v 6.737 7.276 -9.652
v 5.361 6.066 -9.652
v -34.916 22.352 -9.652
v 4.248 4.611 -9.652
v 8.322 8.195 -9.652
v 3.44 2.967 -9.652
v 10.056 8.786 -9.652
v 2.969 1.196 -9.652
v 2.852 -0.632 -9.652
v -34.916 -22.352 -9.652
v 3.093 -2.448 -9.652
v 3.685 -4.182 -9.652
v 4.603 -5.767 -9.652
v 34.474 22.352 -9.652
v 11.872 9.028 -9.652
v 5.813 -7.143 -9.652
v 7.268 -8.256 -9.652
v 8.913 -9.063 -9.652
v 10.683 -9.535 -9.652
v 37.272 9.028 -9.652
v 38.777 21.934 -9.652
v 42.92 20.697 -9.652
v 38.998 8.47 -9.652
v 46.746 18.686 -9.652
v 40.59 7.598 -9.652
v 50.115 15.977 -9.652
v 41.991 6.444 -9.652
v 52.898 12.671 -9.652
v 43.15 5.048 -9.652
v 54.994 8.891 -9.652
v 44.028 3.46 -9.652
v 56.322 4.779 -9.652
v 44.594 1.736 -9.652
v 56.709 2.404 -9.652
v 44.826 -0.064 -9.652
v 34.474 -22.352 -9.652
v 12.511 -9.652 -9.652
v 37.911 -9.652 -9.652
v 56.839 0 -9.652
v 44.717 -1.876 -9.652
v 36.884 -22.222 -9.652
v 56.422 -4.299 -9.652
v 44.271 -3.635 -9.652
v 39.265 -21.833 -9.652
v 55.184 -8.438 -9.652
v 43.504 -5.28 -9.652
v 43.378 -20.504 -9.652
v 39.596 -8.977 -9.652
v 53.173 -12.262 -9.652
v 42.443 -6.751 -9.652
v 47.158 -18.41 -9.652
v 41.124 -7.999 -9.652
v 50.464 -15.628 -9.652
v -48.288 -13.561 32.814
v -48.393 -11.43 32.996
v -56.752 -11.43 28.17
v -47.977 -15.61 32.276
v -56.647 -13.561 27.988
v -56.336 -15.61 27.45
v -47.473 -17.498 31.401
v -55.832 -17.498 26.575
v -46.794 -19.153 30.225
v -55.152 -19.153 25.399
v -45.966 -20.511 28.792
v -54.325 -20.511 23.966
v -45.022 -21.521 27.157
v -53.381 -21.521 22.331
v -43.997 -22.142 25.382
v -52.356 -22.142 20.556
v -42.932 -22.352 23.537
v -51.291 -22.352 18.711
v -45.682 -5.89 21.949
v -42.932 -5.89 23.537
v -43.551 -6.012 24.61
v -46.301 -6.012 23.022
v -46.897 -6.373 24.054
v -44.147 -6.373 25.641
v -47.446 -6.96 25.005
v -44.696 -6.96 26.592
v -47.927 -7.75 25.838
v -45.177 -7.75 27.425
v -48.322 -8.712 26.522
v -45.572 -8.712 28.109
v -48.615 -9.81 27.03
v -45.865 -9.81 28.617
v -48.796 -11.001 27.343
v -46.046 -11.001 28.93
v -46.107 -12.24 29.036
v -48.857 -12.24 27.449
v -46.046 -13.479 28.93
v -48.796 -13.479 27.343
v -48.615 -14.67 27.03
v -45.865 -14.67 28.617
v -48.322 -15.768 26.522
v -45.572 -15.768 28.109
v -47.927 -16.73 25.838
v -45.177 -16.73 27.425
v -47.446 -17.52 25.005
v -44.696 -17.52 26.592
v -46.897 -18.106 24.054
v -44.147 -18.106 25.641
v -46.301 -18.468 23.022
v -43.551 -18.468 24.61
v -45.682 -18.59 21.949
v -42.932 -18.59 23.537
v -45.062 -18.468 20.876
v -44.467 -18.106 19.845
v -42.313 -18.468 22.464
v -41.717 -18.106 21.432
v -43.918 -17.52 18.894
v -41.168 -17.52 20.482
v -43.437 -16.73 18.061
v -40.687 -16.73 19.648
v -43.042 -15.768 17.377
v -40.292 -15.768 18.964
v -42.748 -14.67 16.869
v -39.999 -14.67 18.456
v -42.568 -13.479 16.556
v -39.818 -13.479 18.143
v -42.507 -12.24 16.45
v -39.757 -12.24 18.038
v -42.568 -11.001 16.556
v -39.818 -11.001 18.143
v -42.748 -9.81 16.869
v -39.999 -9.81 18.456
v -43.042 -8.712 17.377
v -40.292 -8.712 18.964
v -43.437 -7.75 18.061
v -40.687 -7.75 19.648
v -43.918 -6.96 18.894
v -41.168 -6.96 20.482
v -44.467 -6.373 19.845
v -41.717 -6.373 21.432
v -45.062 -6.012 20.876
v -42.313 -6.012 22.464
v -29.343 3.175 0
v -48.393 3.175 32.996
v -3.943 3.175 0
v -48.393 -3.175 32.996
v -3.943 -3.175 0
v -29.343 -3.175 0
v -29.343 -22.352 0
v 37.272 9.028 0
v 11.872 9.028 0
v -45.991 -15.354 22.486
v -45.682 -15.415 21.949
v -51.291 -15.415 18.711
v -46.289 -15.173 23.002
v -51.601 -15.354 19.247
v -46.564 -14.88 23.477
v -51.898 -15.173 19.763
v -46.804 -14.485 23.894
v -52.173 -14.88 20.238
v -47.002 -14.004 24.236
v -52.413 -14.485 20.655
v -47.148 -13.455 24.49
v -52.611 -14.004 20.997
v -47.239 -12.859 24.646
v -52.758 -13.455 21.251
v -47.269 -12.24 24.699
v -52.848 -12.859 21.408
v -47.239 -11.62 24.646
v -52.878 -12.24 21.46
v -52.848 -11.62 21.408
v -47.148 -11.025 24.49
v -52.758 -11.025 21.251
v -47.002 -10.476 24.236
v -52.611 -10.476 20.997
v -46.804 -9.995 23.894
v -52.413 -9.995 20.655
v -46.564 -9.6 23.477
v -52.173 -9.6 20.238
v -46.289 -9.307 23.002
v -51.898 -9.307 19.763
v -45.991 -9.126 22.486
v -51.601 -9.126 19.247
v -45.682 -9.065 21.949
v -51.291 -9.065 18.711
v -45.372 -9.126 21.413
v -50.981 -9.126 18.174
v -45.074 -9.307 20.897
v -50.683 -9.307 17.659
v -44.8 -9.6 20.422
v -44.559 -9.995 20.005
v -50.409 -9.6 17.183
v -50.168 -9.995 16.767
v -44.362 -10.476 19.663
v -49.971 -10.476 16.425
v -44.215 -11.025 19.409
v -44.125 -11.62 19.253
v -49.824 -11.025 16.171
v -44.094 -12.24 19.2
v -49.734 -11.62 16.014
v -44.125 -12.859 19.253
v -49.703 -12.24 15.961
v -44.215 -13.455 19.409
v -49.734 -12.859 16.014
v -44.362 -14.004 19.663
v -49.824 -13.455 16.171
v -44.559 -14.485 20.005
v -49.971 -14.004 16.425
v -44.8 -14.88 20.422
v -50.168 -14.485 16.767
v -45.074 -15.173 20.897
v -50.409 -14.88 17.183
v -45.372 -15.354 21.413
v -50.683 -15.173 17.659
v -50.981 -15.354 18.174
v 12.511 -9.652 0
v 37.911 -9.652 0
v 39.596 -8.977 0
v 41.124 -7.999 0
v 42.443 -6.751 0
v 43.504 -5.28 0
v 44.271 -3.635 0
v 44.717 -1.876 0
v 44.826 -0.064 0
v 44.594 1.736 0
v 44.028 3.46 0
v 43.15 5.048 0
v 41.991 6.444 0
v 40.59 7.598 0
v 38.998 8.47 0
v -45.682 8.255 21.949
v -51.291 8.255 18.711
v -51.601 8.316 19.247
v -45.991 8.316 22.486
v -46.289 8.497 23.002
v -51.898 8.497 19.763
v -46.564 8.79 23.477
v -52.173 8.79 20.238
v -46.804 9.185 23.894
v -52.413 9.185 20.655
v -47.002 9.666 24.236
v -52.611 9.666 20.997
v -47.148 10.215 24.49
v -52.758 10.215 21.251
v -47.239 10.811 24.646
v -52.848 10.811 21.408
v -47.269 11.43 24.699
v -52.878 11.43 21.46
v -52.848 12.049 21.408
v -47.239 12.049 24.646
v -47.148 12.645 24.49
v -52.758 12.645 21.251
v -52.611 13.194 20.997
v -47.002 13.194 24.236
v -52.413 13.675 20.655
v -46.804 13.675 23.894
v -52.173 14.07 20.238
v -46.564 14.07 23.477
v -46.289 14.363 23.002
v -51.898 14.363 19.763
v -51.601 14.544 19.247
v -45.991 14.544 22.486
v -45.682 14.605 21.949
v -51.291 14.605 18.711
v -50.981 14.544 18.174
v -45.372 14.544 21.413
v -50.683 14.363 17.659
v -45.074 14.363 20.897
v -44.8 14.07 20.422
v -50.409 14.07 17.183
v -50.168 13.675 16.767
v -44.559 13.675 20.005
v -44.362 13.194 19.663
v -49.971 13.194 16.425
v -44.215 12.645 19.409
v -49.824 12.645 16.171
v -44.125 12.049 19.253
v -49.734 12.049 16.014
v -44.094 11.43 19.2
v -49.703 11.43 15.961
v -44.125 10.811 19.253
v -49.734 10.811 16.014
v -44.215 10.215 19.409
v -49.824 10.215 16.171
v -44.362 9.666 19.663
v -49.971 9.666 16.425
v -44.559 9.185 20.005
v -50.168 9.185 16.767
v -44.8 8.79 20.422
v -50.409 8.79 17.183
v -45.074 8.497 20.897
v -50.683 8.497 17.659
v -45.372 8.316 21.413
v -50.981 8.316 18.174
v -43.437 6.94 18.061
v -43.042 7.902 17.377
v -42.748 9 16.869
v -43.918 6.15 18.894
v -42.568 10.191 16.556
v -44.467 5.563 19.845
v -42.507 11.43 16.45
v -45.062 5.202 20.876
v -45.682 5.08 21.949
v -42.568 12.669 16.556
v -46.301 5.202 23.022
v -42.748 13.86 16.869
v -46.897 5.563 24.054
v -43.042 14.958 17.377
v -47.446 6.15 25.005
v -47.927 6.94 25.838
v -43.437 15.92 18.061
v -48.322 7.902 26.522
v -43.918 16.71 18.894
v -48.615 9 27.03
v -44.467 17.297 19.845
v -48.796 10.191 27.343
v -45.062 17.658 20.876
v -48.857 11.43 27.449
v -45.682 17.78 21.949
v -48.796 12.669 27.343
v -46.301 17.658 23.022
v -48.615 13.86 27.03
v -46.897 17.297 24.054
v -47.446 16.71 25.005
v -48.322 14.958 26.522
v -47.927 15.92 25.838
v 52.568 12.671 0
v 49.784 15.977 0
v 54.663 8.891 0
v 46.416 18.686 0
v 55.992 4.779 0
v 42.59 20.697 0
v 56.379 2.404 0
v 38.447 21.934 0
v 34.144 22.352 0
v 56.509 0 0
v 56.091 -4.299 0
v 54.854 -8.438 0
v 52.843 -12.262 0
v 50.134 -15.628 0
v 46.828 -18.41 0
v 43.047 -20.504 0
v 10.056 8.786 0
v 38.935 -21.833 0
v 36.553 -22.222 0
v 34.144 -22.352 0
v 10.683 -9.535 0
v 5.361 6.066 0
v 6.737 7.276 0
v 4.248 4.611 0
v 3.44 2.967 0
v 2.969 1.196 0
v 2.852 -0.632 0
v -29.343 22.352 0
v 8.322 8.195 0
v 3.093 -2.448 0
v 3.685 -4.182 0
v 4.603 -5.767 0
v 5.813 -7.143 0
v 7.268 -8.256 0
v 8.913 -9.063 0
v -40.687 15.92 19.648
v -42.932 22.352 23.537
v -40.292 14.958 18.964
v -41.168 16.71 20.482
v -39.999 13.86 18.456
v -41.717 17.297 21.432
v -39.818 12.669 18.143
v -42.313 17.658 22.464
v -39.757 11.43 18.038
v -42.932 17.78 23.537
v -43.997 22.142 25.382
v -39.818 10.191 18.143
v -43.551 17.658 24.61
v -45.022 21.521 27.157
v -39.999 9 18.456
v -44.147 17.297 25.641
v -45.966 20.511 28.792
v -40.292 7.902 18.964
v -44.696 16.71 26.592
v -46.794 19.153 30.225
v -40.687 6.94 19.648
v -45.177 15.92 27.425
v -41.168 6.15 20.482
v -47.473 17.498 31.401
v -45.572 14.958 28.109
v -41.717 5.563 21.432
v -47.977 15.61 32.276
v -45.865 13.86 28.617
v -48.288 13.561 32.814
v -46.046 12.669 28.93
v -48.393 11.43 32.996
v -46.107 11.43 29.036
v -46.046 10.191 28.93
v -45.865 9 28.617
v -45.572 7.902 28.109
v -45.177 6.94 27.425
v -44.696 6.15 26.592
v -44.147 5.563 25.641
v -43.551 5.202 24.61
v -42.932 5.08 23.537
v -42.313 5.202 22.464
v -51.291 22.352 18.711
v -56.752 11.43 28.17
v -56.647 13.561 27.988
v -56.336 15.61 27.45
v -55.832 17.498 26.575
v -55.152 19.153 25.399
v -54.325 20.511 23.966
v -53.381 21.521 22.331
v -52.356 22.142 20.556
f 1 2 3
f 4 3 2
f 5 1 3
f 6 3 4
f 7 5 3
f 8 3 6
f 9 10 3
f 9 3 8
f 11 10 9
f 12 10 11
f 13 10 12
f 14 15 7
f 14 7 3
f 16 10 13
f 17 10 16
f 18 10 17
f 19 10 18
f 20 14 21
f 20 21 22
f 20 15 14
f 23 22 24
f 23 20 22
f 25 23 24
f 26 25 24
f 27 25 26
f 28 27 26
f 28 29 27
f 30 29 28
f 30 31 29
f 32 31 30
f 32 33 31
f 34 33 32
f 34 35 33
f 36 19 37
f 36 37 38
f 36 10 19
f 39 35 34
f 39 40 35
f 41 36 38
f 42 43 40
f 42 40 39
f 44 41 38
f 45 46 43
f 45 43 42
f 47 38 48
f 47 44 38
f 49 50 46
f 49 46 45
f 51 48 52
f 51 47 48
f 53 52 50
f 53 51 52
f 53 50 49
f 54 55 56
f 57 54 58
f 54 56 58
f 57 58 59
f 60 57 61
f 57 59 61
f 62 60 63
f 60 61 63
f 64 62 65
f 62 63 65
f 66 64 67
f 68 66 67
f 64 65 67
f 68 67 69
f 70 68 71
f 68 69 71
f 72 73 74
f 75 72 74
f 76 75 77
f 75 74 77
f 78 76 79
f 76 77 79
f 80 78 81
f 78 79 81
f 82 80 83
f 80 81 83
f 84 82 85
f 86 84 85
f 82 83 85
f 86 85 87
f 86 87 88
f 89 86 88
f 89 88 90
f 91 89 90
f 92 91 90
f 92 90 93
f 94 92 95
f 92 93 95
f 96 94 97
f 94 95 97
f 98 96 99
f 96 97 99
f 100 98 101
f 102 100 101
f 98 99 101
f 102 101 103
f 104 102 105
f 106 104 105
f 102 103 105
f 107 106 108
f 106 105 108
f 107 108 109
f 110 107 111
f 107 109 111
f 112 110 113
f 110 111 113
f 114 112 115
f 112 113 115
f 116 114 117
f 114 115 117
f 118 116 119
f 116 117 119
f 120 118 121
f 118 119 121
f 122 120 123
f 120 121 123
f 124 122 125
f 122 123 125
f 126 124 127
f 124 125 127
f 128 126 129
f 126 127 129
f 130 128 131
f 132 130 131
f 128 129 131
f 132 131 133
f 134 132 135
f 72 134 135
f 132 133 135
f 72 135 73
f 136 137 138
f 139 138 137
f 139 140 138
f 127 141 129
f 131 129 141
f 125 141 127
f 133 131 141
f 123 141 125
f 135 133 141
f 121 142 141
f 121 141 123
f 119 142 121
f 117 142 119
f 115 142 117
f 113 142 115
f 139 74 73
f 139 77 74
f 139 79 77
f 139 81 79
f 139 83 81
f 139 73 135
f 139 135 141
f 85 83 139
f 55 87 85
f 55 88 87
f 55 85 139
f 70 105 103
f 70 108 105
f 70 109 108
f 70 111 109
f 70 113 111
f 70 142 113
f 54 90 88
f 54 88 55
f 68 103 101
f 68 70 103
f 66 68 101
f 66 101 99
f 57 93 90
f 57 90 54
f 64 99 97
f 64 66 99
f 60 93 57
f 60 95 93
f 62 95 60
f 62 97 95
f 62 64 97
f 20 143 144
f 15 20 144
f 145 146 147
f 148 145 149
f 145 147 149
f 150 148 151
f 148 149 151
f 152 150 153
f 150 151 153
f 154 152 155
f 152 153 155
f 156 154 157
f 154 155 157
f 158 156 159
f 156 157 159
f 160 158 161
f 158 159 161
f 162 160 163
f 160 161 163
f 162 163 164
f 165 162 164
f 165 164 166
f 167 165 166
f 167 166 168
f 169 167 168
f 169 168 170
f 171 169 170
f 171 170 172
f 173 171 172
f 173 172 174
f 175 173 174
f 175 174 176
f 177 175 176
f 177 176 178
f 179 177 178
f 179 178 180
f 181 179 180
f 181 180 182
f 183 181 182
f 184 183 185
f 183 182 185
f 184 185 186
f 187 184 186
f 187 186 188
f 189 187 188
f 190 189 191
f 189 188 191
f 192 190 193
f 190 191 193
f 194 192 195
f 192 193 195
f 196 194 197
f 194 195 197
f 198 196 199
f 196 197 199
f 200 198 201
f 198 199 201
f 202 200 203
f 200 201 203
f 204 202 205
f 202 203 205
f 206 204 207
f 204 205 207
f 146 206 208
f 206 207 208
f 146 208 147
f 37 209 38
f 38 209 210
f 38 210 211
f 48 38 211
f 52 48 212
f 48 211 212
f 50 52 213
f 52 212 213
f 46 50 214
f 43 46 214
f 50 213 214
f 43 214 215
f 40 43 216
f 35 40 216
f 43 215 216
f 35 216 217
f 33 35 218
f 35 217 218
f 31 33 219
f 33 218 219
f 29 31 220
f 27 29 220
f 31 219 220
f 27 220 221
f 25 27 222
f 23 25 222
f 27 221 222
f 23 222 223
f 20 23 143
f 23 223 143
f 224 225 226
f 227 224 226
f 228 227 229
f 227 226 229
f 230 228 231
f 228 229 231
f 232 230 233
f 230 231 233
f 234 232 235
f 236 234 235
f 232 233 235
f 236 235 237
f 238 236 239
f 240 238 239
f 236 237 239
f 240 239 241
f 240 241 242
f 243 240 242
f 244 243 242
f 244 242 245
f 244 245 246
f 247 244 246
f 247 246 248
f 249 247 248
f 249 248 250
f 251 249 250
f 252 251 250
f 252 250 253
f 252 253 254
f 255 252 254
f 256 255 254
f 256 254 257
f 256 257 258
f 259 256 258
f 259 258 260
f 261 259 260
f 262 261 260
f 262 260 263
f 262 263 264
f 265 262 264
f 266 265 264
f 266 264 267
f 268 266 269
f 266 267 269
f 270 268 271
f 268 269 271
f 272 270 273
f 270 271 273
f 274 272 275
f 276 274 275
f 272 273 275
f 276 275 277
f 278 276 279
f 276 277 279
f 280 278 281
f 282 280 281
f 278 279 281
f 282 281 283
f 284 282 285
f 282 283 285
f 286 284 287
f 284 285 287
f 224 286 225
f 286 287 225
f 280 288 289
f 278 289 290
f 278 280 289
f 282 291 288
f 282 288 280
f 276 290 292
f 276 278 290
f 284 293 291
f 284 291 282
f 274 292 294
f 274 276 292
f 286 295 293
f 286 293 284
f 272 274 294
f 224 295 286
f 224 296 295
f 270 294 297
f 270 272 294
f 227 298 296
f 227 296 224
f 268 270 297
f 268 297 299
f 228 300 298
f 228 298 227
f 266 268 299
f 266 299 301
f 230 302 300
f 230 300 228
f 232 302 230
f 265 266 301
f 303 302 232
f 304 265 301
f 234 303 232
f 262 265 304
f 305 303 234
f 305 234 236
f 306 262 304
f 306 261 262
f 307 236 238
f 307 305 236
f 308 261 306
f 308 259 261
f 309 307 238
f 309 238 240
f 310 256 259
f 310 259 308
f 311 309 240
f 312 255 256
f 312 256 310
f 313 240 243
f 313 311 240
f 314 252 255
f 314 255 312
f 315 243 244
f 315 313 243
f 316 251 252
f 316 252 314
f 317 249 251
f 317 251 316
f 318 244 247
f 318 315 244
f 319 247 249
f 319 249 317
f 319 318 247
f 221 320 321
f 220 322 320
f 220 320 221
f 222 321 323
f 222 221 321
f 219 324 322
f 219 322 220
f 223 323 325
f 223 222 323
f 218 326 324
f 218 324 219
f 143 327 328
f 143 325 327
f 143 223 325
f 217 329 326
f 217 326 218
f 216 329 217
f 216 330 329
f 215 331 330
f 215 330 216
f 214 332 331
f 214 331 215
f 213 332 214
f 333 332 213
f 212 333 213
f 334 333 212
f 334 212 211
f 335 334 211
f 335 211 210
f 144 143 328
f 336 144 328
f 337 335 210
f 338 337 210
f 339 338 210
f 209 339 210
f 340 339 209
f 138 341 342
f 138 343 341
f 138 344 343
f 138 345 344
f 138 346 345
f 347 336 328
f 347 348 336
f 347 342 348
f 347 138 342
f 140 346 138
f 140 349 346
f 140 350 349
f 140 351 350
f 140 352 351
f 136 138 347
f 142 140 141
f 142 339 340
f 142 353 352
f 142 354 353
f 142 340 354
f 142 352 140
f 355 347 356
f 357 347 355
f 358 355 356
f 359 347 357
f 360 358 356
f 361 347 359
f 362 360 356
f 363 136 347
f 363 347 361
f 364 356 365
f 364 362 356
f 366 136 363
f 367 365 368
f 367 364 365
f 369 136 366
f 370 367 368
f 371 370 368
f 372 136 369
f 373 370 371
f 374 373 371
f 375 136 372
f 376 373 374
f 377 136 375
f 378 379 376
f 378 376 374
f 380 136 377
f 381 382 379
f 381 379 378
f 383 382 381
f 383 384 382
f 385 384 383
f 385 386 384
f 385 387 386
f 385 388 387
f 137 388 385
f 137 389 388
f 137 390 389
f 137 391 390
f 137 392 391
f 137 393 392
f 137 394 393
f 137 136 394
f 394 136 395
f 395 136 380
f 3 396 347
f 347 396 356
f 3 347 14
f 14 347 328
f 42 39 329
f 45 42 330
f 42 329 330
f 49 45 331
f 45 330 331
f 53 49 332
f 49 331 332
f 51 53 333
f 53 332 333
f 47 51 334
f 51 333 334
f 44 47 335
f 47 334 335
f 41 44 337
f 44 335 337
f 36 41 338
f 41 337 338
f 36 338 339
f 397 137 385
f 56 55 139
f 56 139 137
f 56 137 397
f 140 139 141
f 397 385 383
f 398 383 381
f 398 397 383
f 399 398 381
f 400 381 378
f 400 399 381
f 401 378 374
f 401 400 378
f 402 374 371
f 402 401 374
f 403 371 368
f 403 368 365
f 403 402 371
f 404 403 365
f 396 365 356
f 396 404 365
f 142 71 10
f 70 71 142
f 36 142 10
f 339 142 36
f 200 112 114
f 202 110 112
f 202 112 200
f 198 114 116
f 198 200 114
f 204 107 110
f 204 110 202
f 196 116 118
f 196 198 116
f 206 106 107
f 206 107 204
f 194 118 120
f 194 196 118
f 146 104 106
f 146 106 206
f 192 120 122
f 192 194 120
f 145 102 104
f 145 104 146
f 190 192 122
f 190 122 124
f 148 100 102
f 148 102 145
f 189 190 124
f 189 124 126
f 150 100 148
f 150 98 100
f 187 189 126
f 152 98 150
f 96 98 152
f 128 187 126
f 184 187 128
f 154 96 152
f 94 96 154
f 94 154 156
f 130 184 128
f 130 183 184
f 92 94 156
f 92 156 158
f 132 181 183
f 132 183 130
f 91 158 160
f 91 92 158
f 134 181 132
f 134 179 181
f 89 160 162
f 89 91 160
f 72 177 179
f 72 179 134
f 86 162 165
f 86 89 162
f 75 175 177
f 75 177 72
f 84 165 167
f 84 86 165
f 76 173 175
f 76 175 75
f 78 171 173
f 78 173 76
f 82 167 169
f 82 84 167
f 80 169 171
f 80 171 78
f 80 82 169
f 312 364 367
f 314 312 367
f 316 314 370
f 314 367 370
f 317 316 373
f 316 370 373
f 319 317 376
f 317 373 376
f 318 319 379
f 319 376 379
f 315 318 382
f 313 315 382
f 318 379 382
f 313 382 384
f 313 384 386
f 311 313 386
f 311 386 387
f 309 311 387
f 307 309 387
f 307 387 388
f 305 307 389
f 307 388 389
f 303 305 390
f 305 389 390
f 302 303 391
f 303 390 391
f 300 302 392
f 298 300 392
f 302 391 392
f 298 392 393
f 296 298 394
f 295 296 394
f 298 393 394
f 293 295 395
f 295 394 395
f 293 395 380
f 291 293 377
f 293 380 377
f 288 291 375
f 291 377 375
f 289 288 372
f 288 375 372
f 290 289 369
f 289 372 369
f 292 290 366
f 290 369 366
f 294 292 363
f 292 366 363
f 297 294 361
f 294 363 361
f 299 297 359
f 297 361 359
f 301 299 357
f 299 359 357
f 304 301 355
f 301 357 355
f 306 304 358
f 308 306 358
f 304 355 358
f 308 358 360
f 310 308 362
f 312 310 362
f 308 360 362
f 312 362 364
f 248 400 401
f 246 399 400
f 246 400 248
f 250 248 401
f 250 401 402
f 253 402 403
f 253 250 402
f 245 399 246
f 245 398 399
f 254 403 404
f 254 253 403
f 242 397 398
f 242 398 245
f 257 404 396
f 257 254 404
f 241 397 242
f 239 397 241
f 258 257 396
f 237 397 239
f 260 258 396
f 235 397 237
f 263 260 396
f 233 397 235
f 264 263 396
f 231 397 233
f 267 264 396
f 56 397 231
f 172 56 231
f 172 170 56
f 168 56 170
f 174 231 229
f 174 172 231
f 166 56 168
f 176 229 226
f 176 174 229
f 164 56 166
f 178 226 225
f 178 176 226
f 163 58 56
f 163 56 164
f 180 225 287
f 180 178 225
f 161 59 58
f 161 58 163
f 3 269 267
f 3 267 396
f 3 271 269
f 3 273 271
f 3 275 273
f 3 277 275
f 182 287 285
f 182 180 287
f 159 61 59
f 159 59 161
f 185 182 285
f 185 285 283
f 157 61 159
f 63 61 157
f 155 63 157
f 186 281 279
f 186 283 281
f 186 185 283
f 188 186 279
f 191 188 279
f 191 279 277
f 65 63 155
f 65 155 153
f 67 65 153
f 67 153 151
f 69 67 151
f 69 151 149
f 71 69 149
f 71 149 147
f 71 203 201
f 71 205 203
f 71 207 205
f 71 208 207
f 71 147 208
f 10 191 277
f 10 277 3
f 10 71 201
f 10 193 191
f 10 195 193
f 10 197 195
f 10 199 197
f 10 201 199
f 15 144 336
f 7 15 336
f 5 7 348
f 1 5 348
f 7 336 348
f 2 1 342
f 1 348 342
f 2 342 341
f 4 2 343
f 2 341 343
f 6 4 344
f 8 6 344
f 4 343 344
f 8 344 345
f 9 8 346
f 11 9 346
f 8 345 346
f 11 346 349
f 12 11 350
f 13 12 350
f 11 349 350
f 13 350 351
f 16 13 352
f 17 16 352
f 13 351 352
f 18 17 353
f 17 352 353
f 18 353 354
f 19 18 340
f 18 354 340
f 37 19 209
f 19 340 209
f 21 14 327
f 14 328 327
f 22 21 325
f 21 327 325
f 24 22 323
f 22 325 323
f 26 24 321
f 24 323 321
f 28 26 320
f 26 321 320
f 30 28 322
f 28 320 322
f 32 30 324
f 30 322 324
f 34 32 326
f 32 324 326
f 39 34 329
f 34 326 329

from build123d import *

# Parameters (mm, degrees)
F1_DEPTH  = 22.352
F2_DEPTH  = 3.175
F4_R      = 22.35199
F5_R      = 3.175
F6_DEPTH  = 25.4
F7_R      = 6.35
F7_R_2    = 3.175
F8_DEPTH  = 3.175
F9_R      = 10.922
F10_DEPTH = 25.4


# Not quite as in the source:
# - a fillet or chamfer is up to 0.001 mm smaller than in the source, because OpenCascade refuses the exact size


with BuildPart() as f1:
    # F0 (on Front) → F1 (new body, symmetric)
    with BuildSketch(Plane.XZ):
        Polygon((-3.9430456236, 0), (-29.3430456236, 0), (-48.3930456236, 32.9955678842), (-56.7519228209, 28.1695678842), (-34.9156304218, -9.652), (56.8391502193, -9.652), (56.5089543764, 0), align=None)
    extrude(amount=F1_DEPTH, both=True)

    # F0 (on Front) → F2 (join, symmetric)
    with BuildSketch(Plane.XZ):
        Polygon((-48.3930456236, 32.9955678842), (-29.3430456236, 0), (-3.9430456236, 0), align=None)
    extrude(amount=F2_DEPTH, both=True)

    # F4 (radius 22.352 in the source; OpenCascade refuses exactly that, so slightly less here)
    f4_edges = [f1.edges().sort_by_distance(p)[0] for p in [
        (56.674052, -22.352, -4.826),
        (56.674052, 22.352, -4.826),
    ]]
    fillet(f4_edges, radius=F4_R)

    # F5 (on face) → F6 (cut)
    with BuildSketch(Plane(origin=(-30.366161415, 0, -17.5319114672), x_dir=(0, -1, 0), z_dir=(-0.8660254038, 0, -0.5))):
        with Locations((-11.43, 41.8495228118)):
            Circle(F5_R)
        with Locations((12.2398376594, 41.8495228118)):
            Circle(F5_R)
    extrude(amount=-F6_DEPTH, mode=Mode.SUBTRACT)

    # F7 (on face) → F8 (cut)
    with BuildSketch(Plane(origin=(-22.0072842177, 0, -12.7059114672), x_dir=(0, 1, 0), z_dir=(0.8660254038, 0, 0.5))):
        with Locations((-12.2398376594, 41.8495228118)):
            Circle(F7_R)
        with Locations((-12.2398376594, 41.8495228118)):
            Circle(F7_R_2, mode=Mode.SUBTRACT)
        with Locations((11.43, 41.8495228118)):
            Circle(F7_R)
    extrude(amount=-F8_DEPTH, mode=Mode.SUBTRACT)

    # F9
    f9_edges = [f1.edges().sort_by_distance(p)[0] for p in [
        (-52.572484, 22.352, 30.582568),
        (-52.572484, -22.352, 30.582568),
    ]]
    fillet(f9_edges, radius=F9_R)

    # F3 (on face) → F10 (cut)
    with BuildSketch(Plane.XY):
        with BuildLine():
            Line((37.2716346684, 9.027880175), (11.8716346684, 9.027880175))
            ThreePointArc((11.8716346684, 9.027880175), (2.8515551479, -0.6319204795), (12.5113558024, -9.652))
            Line((12.5113558024, -9.652), (37.9113558024, -9.652))
            ThreePointArc((37.9113558024, -9.652), (44.825892917, -0.0643068731), (37.2716346684, 9.027880175))
        make_face()
    extrude(amount=-F10_DEPTH, mode=Mode.SUBTRACT)


solid = f1.part
